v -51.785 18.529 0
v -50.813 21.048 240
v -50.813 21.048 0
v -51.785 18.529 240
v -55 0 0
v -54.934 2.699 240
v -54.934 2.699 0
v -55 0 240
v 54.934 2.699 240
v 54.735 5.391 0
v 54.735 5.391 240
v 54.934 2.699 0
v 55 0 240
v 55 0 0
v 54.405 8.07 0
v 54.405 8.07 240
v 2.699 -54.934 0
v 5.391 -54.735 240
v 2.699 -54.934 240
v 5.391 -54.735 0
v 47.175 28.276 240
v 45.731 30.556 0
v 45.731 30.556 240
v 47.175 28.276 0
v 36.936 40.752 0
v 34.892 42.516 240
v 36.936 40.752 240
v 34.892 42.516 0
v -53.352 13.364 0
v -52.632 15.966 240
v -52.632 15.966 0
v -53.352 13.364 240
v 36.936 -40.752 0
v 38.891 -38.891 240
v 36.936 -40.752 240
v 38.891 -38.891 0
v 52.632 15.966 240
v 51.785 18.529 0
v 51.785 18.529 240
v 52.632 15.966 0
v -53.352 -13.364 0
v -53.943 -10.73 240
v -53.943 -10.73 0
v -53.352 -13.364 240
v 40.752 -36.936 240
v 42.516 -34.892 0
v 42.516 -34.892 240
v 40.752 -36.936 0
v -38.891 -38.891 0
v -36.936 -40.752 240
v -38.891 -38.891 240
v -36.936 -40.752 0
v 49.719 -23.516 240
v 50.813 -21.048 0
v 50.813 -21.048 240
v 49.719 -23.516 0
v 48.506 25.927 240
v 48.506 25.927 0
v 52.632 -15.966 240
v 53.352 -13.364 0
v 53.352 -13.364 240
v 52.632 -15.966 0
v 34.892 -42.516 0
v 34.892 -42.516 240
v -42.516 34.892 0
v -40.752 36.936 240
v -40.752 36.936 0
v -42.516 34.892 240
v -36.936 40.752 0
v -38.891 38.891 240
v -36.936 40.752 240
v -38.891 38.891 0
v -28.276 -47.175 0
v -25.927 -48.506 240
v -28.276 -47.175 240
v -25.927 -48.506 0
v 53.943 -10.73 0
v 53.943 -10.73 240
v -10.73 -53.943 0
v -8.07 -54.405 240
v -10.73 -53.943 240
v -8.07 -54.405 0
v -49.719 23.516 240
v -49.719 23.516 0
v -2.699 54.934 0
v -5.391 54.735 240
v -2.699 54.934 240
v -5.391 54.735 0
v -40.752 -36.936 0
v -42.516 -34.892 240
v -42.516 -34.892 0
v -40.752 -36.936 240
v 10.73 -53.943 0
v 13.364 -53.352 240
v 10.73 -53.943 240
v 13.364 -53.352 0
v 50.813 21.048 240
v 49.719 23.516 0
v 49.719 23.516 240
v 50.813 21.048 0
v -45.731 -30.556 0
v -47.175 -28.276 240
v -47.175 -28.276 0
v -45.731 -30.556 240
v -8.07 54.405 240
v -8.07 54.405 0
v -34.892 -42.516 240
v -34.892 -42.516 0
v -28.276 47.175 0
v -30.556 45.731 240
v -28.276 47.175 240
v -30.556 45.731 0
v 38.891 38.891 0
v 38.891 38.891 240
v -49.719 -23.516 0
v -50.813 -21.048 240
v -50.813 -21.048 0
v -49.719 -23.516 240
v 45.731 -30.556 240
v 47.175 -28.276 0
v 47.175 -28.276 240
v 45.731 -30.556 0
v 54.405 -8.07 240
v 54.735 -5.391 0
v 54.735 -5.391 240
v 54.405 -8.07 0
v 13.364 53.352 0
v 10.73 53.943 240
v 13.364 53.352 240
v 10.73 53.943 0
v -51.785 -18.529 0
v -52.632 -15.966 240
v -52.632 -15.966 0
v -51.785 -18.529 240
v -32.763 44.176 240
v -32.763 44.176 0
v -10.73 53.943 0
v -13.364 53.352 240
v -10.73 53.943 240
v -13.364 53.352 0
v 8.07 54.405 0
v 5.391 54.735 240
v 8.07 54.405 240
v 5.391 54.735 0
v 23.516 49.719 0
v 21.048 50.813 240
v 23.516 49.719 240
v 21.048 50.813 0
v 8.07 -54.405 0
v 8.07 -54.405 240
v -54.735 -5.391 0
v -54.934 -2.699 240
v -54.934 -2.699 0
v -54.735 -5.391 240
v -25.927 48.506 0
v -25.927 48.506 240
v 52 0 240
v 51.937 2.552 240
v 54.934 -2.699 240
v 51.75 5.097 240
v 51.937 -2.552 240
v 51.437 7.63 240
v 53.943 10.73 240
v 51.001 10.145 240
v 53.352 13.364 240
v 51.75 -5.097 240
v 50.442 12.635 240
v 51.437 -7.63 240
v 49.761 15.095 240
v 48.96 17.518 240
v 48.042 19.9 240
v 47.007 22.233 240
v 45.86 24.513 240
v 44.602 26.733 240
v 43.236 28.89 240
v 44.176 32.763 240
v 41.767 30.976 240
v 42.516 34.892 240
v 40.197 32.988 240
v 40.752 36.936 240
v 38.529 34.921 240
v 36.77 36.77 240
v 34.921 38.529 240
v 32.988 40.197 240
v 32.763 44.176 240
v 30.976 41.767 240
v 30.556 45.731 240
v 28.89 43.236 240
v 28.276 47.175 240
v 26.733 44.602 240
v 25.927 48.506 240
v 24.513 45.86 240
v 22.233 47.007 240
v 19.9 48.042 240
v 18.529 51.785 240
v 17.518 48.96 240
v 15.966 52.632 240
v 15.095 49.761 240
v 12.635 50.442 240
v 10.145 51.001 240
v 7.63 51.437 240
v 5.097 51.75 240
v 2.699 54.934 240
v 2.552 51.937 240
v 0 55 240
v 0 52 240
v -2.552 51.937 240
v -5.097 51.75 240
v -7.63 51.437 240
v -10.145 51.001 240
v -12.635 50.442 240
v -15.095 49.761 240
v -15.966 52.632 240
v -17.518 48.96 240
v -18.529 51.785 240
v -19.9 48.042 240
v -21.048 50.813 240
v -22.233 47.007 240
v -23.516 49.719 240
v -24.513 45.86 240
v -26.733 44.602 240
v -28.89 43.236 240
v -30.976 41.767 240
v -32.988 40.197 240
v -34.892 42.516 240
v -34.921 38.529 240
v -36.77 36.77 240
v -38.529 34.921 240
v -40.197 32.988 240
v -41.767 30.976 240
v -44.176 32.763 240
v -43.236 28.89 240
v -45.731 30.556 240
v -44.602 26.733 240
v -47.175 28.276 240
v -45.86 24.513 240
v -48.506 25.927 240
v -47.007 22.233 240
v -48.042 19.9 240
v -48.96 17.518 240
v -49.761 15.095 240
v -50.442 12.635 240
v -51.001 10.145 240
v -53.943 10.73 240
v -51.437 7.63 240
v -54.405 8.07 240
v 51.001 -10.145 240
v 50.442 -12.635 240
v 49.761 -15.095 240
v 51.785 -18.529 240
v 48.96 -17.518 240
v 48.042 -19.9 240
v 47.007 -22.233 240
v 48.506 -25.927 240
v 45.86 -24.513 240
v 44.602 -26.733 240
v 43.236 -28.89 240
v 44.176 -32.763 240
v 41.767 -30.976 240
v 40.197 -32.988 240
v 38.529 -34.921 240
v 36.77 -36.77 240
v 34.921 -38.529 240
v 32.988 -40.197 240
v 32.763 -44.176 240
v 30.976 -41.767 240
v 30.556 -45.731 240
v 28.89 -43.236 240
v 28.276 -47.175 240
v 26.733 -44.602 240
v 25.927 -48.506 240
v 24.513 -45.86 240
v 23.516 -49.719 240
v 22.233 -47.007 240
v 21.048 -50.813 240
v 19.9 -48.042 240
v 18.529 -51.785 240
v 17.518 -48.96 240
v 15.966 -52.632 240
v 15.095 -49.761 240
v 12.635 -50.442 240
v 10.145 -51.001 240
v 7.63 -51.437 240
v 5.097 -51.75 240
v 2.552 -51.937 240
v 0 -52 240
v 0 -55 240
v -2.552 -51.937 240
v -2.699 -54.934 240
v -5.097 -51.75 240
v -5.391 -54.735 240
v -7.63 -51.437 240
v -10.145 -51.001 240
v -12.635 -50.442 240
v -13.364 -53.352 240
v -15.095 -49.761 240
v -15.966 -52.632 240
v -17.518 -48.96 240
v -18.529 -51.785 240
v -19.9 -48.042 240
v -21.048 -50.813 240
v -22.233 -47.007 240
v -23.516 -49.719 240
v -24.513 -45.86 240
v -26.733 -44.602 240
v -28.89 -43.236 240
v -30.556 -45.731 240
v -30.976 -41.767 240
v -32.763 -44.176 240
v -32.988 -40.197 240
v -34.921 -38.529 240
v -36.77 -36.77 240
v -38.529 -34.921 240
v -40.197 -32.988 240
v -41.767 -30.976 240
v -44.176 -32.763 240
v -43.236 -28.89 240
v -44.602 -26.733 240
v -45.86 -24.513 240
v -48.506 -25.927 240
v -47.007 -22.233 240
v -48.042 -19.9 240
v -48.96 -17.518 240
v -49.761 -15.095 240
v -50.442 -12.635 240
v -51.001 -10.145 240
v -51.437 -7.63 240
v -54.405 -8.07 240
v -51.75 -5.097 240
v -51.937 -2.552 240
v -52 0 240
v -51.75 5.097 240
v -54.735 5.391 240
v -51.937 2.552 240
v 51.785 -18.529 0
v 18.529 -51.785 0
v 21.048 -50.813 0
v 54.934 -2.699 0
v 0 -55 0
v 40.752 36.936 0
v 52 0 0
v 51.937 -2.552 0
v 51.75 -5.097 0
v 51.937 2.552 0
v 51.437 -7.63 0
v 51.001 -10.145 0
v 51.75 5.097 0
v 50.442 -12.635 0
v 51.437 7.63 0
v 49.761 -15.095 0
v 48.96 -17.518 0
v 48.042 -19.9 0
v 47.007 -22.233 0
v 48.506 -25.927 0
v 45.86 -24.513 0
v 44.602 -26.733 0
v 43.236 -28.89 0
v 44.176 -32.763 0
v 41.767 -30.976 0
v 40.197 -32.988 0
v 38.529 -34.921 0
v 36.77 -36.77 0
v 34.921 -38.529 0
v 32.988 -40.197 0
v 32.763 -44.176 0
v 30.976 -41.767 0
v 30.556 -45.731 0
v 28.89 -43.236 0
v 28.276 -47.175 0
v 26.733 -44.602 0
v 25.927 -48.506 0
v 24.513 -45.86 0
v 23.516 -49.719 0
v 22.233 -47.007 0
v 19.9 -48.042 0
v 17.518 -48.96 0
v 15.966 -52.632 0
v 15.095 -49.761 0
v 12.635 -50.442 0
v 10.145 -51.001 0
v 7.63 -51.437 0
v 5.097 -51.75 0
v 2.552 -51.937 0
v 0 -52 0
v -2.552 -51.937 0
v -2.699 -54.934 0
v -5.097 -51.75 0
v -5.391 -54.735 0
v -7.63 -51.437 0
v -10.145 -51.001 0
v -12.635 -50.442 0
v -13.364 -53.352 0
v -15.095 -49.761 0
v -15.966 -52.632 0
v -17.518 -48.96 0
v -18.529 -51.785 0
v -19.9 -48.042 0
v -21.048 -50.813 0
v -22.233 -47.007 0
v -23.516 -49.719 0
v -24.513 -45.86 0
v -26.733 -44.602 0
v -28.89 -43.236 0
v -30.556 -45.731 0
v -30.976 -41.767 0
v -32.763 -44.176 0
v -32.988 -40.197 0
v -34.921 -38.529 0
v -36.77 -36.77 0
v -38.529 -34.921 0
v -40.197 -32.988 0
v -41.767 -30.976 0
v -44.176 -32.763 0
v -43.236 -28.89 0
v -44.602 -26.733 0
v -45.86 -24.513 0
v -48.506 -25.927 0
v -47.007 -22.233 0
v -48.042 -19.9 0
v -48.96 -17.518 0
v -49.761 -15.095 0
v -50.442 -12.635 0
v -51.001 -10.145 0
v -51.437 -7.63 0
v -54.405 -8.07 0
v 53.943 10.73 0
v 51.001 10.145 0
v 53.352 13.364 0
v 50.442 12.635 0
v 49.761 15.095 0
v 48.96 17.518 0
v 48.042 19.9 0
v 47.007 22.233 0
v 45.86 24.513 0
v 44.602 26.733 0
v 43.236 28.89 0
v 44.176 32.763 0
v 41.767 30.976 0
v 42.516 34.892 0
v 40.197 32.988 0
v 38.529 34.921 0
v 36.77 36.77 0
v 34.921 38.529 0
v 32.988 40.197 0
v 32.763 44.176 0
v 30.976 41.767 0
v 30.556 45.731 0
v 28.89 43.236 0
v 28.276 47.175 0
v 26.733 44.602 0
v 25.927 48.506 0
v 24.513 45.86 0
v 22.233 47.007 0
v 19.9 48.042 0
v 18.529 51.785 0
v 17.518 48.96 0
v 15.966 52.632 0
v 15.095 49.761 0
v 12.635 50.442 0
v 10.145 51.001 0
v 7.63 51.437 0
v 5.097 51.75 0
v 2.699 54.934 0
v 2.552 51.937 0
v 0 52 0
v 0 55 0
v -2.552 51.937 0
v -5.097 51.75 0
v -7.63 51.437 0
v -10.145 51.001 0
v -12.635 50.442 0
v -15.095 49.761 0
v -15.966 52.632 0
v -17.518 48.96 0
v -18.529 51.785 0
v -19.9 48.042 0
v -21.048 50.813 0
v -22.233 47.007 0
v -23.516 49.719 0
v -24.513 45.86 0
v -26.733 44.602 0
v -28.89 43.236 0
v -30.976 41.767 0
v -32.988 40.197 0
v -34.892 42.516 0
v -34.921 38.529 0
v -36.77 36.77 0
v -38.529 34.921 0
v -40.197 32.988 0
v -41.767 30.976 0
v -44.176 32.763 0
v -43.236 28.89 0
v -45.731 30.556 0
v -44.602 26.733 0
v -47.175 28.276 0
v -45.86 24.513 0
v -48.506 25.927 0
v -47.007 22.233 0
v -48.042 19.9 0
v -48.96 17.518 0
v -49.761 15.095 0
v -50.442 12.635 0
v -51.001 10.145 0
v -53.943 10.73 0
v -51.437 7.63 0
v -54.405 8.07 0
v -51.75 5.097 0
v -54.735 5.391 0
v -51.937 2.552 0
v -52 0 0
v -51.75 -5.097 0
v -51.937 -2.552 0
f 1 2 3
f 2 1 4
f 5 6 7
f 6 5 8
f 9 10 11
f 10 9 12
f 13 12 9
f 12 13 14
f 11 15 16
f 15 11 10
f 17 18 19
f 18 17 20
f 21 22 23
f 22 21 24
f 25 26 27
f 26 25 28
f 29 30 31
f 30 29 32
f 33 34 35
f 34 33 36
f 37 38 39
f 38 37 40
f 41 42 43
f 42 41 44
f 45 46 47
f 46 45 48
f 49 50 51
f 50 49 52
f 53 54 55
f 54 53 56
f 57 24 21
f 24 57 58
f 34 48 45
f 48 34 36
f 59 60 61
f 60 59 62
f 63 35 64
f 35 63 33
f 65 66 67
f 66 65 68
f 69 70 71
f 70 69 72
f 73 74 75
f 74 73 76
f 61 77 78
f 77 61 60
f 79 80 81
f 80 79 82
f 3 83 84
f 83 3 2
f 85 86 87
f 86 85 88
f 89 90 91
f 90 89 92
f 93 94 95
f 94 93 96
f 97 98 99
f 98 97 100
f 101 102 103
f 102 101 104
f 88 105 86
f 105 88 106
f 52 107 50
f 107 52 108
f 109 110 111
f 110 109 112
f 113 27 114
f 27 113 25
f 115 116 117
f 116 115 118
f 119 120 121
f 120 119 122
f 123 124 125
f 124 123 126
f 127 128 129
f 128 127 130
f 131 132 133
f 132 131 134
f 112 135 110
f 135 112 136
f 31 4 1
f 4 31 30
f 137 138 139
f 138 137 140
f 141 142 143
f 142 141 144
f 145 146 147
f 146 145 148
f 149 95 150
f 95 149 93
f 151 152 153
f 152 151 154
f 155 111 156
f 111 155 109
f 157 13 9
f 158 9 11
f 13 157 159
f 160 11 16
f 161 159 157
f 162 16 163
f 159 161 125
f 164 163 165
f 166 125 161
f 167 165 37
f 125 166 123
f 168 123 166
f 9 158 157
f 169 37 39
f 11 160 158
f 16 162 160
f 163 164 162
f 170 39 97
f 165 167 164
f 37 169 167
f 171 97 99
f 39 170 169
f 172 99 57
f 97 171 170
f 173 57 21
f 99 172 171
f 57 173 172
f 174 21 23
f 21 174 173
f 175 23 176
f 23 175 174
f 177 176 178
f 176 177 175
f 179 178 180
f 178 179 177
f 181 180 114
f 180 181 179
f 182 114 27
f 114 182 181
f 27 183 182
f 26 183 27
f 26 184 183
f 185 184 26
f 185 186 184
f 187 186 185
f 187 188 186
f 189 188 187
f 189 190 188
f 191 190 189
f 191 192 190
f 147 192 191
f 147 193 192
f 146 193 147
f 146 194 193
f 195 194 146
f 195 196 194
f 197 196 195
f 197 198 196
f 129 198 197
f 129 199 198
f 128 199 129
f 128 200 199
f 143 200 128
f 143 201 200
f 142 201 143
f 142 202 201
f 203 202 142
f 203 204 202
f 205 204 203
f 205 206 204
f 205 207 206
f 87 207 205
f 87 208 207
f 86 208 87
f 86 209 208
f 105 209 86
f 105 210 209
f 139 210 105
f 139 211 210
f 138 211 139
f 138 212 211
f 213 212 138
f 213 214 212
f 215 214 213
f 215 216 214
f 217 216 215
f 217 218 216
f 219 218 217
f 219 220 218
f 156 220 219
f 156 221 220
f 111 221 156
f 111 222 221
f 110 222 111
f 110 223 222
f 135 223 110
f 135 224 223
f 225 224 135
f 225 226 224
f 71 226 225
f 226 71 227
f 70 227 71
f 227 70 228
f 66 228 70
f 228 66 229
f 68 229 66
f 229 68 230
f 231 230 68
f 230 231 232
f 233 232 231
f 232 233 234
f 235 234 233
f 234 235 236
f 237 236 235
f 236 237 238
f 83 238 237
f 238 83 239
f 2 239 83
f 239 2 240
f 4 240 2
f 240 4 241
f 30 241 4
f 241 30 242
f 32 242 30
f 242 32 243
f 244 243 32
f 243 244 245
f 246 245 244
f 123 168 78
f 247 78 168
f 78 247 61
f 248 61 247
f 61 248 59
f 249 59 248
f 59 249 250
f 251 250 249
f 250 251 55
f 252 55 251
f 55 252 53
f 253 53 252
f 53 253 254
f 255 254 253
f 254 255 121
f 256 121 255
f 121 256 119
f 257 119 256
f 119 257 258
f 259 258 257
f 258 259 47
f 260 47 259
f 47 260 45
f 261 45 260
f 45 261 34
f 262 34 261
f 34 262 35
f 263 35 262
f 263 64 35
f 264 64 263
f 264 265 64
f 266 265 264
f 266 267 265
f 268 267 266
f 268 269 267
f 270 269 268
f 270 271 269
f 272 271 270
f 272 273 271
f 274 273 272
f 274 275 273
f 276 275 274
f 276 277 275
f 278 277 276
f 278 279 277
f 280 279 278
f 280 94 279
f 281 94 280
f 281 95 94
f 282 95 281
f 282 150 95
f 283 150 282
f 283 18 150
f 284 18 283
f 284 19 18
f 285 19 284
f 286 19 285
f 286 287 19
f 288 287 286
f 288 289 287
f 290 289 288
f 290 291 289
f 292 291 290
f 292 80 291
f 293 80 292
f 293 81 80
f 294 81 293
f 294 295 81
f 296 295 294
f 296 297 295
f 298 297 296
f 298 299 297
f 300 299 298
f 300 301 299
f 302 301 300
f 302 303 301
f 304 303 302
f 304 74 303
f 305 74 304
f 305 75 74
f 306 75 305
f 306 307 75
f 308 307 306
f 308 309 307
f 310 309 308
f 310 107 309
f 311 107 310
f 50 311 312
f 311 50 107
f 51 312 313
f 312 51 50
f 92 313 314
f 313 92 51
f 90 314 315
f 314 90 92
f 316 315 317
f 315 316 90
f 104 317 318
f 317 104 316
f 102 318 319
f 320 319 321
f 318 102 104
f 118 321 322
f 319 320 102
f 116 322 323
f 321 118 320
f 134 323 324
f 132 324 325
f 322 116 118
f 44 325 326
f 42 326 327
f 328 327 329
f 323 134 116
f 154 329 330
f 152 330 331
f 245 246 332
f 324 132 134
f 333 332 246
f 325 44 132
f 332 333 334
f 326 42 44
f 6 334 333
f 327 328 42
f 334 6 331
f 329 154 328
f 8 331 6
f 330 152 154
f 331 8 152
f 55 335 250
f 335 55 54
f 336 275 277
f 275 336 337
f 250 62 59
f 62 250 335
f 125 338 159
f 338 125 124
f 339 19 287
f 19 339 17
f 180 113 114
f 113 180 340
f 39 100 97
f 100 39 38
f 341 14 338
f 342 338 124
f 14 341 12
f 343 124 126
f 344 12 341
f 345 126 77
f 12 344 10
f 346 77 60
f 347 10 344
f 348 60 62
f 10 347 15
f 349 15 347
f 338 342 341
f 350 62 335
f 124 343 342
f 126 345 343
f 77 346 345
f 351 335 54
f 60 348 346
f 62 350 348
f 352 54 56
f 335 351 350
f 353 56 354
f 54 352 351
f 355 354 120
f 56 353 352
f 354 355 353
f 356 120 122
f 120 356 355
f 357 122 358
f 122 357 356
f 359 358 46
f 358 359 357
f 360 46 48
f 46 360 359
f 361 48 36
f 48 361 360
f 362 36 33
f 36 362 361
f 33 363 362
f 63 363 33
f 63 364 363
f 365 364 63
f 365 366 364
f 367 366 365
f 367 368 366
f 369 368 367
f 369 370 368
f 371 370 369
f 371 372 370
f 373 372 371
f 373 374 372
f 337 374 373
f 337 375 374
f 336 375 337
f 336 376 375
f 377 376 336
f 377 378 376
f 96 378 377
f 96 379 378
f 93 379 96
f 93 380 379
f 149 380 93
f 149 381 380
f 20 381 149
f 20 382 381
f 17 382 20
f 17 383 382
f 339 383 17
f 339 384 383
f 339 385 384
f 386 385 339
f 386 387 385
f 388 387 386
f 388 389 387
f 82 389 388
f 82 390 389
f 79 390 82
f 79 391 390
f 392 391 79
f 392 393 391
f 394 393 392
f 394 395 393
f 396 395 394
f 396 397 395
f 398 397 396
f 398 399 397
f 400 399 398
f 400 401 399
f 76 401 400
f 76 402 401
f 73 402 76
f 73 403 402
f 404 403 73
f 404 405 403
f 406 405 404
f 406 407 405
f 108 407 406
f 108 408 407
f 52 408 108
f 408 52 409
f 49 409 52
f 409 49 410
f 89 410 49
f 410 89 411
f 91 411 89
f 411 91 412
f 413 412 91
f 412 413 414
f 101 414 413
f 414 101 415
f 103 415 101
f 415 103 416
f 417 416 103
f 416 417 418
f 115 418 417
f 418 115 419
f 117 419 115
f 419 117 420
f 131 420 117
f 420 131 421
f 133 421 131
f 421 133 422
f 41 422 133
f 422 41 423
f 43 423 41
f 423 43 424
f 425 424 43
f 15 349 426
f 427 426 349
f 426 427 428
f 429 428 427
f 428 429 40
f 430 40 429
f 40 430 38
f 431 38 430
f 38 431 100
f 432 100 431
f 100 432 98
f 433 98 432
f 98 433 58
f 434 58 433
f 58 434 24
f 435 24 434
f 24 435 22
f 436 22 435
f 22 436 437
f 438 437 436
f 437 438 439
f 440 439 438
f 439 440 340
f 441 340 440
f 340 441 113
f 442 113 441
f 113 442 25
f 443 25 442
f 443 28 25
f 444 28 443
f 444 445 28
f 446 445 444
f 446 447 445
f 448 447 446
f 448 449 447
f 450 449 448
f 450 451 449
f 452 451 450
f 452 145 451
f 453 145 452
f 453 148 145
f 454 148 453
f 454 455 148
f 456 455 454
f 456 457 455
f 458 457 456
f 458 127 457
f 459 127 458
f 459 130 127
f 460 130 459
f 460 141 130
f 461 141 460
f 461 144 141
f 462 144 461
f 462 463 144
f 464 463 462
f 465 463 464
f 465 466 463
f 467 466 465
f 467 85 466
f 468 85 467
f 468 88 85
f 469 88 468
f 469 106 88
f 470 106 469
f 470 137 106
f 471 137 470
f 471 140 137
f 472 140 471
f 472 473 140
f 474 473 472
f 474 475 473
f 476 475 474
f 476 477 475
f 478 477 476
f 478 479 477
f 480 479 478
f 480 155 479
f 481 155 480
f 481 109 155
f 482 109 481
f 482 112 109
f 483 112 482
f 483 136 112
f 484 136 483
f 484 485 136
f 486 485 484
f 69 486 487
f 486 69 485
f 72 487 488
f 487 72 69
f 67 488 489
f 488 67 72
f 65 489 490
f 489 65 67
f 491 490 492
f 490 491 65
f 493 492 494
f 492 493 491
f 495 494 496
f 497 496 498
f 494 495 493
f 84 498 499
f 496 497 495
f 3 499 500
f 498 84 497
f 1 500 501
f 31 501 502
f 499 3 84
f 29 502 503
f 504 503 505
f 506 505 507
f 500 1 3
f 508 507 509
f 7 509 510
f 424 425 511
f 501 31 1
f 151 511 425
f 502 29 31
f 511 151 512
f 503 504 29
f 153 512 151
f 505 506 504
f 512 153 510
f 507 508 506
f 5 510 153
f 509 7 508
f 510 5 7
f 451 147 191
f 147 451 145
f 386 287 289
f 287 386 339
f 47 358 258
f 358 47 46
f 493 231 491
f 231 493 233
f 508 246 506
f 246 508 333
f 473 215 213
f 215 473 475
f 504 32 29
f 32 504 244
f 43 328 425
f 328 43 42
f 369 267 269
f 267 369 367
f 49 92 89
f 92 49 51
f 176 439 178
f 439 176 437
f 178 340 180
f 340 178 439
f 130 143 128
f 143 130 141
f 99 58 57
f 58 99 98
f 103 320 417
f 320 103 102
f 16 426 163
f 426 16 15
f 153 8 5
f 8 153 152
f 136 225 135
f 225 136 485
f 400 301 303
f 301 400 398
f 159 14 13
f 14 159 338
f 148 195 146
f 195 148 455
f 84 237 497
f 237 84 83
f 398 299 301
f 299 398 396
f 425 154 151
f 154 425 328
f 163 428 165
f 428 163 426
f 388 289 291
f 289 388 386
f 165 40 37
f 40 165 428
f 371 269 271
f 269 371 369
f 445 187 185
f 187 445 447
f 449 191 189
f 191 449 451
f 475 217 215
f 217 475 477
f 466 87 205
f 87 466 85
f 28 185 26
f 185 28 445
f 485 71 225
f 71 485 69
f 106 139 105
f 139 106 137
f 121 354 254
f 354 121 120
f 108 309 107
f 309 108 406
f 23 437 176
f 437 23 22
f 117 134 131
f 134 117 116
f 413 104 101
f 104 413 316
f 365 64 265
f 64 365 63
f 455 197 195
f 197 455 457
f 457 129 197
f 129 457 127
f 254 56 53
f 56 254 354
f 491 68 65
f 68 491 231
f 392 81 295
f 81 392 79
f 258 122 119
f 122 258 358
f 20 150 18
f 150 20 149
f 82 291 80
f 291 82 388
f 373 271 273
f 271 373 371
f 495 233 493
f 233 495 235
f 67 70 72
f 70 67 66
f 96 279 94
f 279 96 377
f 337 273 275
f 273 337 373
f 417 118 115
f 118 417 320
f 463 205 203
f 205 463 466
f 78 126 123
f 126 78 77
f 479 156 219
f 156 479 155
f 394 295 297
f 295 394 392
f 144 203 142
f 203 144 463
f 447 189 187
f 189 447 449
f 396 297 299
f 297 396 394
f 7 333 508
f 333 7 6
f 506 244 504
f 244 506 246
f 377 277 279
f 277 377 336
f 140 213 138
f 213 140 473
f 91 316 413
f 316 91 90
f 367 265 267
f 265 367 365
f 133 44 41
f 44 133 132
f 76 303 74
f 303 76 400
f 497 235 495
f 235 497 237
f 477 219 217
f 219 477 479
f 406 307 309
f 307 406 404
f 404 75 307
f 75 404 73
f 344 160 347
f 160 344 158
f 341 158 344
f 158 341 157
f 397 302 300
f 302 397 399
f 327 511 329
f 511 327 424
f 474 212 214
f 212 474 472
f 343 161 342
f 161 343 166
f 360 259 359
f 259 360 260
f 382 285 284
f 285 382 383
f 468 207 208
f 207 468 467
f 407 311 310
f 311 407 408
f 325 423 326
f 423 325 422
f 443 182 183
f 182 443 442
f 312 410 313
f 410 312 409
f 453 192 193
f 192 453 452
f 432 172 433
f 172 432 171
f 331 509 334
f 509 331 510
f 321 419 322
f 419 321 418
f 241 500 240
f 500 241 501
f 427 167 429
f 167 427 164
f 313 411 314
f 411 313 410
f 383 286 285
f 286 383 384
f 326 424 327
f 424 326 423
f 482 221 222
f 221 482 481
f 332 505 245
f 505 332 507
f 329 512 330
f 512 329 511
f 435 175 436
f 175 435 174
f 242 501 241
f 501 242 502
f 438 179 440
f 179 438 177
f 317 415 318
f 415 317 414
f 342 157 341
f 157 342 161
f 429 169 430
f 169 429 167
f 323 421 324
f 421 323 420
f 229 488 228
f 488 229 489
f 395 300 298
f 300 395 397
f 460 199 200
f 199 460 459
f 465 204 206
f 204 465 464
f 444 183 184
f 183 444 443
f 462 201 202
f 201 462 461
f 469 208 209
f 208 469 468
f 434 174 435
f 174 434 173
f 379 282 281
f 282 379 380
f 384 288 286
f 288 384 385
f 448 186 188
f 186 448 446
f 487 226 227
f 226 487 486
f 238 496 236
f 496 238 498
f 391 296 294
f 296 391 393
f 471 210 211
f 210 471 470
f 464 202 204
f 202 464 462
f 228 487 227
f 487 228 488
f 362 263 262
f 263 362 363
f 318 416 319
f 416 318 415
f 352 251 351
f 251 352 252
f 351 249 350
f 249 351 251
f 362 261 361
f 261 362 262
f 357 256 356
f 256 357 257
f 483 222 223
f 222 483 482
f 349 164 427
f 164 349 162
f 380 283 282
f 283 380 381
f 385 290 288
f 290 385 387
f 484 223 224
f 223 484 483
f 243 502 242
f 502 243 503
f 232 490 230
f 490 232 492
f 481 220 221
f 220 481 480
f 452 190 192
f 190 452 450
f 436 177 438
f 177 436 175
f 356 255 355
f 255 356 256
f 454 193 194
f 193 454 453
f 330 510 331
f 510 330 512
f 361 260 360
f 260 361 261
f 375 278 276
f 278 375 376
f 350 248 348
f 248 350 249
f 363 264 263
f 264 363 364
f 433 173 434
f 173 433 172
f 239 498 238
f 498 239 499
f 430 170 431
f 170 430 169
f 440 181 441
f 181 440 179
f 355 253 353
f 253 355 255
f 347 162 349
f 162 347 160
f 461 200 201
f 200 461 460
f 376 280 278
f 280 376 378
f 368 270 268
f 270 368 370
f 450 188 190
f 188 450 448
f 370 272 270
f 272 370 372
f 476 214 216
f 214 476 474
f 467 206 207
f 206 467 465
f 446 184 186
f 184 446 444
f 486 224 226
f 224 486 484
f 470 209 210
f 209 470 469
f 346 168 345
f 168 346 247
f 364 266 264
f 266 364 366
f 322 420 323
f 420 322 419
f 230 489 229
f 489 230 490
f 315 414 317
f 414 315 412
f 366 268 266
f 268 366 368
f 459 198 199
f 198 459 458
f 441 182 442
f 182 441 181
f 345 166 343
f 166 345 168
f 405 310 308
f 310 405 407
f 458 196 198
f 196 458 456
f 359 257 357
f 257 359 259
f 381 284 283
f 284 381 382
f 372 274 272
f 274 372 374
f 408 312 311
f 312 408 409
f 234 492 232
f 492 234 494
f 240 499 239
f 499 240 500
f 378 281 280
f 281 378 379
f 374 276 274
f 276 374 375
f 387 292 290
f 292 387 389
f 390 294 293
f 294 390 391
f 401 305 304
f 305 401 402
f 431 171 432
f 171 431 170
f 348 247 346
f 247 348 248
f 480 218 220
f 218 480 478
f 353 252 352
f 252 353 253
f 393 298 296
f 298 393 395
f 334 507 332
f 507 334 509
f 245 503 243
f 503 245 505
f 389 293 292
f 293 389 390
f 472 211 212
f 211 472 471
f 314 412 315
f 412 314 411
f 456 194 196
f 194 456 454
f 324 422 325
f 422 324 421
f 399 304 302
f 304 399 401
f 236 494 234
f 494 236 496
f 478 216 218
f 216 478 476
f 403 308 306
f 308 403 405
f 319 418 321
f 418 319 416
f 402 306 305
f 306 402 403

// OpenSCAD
// SPDX-License-Identifier: AGPL-3.0-or-later
// ecocell-ocean pressure tube — 110mm OD x 3mm wall x 240mm long
$fn = 128;
difference() {
  cylinder(d=110, h=240);
  cylinder(d=104, h=240);
}
